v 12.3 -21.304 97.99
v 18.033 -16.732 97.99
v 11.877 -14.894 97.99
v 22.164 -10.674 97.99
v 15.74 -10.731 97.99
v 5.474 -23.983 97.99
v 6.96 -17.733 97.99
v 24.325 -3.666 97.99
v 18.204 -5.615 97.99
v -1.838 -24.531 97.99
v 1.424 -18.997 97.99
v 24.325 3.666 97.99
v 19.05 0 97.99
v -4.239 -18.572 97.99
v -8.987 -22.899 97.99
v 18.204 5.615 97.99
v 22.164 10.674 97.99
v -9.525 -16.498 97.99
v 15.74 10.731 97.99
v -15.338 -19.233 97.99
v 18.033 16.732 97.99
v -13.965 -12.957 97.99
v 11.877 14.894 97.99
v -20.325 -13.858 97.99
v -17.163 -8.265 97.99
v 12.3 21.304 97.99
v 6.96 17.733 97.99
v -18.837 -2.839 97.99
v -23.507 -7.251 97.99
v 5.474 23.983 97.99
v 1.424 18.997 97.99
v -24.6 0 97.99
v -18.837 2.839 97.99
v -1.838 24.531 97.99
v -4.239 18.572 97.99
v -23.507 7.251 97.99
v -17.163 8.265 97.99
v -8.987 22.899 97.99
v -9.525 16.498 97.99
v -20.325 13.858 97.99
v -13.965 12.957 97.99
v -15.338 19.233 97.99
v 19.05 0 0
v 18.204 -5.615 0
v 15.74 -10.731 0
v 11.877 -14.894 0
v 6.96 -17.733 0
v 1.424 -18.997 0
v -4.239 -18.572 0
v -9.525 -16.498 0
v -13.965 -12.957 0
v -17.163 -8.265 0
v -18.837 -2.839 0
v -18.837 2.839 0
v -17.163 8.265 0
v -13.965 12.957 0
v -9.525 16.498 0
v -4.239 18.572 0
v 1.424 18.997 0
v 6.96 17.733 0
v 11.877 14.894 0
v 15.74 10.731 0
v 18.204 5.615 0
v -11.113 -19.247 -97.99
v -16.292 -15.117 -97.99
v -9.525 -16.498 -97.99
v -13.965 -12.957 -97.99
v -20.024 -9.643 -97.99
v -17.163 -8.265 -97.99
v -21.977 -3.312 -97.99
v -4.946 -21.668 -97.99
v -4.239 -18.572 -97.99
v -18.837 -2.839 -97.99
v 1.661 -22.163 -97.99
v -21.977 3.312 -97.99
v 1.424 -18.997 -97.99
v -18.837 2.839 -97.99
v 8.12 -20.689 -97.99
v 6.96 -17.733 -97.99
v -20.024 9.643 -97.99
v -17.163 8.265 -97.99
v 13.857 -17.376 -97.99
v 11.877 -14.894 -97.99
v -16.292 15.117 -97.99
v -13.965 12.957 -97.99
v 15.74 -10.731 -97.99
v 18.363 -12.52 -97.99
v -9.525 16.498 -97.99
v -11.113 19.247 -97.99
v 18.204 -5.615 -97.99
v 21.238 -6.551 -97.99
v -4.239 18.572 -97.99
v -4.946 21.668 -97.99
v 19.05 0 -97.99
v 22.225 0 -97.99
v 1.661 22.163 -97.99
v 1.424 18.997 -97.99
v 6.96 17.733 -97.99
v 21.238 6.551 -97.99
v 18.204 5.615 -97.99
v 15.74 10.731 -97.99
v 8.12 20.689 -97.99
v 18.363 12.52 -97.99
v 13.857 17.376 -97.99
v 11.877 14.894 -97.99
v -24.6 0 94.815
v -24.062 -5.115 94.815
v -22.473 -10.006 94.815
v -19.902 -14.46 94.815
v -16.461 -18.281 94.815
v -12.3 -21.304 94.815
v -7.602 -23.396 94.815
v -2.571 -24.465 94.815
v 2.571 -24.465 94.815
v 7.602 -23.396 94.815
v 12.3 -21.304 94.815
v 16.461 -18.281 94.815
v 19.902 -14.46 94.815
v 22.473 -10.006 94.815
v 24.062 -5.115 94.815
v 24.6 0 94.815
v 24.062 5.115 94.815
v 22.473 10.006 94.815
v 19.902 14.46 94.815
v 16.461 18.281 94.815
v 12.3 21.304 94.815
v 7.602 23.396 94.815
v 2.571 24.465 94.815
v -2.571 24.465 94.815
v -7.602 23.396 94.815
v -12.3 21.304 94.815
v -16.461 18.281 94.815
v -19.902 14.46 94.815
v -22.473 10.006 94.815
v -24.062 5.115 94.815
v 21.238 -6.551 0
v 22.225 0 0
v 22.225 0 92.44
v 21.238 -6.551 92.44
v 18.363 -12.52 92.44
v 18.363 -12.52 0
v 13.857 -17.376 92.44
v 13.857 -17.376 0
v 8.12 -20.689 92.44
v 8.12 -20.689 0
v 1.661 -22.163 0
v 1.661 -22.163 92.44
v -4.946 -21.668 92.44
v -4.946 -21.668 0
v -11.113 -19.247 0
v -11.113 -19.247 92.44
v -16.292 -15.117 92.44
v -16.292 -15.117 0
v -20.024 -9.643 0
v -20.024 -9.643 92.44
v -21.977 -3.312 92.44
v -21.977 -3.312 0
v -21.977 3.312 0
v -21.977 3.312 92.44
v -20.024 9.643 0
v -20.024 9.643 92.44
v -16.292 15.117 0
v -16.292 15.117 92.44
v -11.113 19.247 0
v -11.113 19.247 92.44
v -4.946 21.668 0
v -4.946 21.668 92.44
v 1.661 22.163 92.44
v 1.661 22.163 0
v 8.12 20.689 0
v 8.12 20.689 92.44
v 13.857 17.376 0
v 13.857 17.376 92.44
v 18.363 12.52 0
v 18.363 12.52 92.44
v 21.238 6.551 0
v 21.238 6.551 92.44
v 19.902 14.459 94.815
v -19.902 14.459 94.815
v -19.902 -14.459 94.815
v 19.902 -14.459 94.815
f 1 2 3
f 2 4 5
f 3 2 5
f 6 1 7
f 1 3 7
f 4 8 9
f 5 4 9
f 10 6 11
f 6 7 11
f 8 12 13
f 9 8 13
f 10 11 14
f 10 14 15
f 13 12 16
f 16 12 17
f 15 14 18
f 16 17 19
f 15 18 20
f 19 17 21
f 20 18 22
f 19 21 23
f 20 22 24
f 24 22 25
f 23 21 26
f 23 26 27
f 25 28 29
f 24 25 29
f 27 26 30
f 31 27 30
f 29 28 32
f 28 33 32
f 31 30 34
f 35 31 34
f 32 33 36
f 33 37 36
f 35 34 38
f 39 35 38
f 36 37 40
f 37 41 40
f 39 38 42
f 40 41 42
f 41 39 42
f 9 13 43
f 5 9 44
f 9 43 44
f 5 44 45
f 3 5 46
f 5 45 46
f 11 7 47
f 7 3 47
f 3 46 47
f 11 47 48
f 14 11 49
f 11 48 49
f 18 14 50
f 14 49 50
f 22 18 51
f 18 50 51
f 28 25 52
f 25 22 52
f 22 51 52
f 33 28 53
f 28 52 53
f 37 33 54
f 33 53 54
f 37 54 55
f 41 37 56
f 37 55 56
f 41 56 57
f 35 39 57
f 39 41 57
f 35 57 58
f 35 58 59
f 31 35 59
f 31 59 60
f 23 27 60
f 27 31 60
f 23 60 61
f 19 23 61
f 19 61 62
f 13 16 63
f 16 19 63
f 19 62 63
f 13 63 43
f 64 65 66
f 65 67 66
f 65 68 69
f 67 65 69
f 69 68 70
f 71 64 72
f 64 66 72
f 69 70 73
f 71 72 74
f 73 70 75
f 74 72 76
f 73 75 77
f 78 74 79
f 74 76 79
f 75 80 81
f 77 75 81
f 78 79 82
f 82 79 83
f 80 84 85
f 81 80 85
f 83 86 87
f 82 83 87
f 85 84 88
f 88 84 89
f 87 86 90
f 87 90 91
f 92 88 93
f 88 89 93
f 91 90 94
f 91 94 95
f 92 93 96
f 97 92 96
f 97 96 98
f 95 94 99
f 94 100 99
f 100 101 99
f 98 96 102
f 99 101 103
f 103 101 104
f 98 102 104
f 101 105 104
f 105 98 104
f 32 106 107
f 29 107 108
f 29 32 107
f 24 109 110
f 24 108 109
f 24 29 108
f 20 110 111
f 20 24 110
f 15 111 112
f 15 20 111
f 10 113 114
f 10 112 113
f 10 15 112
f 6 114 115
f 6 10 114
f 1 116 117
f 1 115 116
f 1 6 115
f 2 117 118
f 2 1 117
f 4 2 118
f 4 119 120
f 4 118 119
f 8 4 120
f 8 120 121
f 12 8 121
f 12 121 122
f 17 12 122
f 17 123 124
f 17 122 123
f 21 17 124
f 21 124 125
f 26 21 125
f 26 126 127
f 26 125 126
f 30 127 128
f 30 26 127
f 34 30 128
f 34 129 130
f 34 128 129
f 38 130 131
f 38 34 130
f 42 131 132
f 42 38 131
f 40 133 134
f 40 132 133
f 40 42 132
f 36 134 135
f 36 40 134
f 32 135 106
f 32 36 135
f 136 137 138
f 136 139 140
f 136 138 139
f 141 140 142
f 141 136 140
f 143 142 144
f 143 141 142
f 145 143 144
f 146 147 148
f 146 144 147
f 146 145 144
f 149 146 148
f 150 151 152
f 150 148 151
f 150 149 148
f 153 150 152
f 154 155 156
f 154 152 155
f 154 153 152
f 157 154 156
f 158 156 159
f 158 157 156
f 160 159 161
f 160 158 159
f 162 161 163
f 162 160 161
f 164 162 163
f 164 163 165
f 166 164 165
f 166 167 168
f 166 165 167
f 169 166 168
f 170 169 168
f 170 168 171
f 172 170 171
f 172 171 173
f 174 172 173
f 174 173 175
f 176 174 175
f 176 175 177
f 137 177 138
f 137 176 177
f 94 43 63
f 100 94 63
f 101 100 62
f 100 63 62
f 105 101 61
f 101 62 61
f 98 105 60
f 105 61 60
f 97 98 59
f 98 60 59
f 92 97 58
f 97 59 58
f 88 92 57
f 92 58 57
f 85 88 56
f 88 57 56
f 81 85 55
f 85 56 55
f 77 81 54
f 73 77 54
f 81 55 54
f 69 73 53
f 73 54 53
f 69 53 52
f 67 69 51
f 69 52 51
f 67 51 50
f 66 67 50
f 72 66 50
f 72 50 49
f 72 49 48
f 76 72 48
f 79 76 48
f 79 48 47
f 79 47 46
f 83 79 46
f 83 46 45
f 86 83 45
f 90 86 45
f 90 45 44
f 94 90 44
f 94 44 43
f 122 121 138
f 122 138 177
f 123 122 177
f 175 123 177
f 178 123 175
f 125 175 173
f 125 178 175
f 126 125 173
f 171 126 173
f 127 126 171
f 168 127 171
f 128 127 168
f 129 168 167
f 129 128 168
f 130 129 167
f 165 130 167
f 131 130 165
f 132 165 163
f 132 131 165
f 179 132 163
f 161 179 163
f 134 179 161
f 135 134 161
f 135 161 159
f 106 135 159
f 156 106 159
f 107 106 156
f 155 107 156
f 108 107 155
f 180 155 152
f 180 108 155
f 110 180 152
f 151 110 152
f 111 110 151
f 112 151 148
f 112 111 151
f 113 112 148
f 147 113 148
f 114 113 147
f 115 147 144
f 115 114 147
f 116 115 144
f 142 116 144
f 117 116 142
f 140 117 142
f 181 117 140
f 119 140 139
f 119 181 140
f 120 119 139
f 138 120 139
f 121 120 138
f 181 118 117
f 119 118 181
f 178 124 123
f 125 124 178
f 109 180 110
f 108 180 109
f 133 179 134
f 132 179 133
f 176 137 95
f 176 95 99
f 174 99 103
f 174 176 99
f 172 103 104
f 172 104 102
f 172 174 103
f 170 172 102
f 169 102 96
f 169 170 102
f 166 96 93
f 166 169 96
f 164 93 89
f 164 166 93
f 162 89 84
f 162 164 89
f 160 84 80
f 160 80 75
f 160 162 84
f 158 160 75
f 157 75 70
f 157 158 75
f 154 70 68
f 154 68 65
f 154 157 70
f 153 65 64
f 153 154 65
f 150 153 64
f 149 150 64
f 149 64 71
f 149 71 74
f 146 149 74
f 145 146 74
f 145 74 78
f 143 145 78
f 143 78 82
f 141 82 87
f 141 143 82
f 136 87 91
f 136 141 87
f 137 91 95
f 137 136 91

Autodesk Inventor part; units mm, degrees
ref_plane "YZ Plane" through (0, 0, 0) normal (1, 0, 0) x (0, 1, 0)
ref_plane "XZ Plane" through (0, 0, 0) normal (0, 1, 0) x (-1, 0, 0)
ref_plane "XY Plane" through (0, 0, 0) normal (0, 0, 1) x (1, 0, 0)
sketch "Sketch2" plane through (0, 0, 0) normal (0, 0, 1) x (1, 0, 0)
  circle A0 centre (0, 0) radius 19.05
  circle A1 centre (0, 0) radius 22.225
  dimension "d0" = 38.1
  dimension "d1" = 3.175
extrude "Extrusion1" add sketch "Sketch2" along normal mid plane 195.98
sketch "Sketch3" plane through (0, 0, 97.99) normal (0, 0, -1) x (-1, 0, 0)
  circle A0 centre (0, 0) radius 22.225 projected
  circle A1 centre (0, 0) radius 24.6
  dimension "d4" = 49.2
  dimension "d7" = 2.375
extrude "Extrusion2" add sketch "Sketch3" along normal blind 3.175
chamfer "Chamfer2" distance 2.3749 angle 45 1 edges at (-22.225, 0, 94.815)
properties part number "TUBE,1.5IN,ARM" material "Aluminum 7075"
